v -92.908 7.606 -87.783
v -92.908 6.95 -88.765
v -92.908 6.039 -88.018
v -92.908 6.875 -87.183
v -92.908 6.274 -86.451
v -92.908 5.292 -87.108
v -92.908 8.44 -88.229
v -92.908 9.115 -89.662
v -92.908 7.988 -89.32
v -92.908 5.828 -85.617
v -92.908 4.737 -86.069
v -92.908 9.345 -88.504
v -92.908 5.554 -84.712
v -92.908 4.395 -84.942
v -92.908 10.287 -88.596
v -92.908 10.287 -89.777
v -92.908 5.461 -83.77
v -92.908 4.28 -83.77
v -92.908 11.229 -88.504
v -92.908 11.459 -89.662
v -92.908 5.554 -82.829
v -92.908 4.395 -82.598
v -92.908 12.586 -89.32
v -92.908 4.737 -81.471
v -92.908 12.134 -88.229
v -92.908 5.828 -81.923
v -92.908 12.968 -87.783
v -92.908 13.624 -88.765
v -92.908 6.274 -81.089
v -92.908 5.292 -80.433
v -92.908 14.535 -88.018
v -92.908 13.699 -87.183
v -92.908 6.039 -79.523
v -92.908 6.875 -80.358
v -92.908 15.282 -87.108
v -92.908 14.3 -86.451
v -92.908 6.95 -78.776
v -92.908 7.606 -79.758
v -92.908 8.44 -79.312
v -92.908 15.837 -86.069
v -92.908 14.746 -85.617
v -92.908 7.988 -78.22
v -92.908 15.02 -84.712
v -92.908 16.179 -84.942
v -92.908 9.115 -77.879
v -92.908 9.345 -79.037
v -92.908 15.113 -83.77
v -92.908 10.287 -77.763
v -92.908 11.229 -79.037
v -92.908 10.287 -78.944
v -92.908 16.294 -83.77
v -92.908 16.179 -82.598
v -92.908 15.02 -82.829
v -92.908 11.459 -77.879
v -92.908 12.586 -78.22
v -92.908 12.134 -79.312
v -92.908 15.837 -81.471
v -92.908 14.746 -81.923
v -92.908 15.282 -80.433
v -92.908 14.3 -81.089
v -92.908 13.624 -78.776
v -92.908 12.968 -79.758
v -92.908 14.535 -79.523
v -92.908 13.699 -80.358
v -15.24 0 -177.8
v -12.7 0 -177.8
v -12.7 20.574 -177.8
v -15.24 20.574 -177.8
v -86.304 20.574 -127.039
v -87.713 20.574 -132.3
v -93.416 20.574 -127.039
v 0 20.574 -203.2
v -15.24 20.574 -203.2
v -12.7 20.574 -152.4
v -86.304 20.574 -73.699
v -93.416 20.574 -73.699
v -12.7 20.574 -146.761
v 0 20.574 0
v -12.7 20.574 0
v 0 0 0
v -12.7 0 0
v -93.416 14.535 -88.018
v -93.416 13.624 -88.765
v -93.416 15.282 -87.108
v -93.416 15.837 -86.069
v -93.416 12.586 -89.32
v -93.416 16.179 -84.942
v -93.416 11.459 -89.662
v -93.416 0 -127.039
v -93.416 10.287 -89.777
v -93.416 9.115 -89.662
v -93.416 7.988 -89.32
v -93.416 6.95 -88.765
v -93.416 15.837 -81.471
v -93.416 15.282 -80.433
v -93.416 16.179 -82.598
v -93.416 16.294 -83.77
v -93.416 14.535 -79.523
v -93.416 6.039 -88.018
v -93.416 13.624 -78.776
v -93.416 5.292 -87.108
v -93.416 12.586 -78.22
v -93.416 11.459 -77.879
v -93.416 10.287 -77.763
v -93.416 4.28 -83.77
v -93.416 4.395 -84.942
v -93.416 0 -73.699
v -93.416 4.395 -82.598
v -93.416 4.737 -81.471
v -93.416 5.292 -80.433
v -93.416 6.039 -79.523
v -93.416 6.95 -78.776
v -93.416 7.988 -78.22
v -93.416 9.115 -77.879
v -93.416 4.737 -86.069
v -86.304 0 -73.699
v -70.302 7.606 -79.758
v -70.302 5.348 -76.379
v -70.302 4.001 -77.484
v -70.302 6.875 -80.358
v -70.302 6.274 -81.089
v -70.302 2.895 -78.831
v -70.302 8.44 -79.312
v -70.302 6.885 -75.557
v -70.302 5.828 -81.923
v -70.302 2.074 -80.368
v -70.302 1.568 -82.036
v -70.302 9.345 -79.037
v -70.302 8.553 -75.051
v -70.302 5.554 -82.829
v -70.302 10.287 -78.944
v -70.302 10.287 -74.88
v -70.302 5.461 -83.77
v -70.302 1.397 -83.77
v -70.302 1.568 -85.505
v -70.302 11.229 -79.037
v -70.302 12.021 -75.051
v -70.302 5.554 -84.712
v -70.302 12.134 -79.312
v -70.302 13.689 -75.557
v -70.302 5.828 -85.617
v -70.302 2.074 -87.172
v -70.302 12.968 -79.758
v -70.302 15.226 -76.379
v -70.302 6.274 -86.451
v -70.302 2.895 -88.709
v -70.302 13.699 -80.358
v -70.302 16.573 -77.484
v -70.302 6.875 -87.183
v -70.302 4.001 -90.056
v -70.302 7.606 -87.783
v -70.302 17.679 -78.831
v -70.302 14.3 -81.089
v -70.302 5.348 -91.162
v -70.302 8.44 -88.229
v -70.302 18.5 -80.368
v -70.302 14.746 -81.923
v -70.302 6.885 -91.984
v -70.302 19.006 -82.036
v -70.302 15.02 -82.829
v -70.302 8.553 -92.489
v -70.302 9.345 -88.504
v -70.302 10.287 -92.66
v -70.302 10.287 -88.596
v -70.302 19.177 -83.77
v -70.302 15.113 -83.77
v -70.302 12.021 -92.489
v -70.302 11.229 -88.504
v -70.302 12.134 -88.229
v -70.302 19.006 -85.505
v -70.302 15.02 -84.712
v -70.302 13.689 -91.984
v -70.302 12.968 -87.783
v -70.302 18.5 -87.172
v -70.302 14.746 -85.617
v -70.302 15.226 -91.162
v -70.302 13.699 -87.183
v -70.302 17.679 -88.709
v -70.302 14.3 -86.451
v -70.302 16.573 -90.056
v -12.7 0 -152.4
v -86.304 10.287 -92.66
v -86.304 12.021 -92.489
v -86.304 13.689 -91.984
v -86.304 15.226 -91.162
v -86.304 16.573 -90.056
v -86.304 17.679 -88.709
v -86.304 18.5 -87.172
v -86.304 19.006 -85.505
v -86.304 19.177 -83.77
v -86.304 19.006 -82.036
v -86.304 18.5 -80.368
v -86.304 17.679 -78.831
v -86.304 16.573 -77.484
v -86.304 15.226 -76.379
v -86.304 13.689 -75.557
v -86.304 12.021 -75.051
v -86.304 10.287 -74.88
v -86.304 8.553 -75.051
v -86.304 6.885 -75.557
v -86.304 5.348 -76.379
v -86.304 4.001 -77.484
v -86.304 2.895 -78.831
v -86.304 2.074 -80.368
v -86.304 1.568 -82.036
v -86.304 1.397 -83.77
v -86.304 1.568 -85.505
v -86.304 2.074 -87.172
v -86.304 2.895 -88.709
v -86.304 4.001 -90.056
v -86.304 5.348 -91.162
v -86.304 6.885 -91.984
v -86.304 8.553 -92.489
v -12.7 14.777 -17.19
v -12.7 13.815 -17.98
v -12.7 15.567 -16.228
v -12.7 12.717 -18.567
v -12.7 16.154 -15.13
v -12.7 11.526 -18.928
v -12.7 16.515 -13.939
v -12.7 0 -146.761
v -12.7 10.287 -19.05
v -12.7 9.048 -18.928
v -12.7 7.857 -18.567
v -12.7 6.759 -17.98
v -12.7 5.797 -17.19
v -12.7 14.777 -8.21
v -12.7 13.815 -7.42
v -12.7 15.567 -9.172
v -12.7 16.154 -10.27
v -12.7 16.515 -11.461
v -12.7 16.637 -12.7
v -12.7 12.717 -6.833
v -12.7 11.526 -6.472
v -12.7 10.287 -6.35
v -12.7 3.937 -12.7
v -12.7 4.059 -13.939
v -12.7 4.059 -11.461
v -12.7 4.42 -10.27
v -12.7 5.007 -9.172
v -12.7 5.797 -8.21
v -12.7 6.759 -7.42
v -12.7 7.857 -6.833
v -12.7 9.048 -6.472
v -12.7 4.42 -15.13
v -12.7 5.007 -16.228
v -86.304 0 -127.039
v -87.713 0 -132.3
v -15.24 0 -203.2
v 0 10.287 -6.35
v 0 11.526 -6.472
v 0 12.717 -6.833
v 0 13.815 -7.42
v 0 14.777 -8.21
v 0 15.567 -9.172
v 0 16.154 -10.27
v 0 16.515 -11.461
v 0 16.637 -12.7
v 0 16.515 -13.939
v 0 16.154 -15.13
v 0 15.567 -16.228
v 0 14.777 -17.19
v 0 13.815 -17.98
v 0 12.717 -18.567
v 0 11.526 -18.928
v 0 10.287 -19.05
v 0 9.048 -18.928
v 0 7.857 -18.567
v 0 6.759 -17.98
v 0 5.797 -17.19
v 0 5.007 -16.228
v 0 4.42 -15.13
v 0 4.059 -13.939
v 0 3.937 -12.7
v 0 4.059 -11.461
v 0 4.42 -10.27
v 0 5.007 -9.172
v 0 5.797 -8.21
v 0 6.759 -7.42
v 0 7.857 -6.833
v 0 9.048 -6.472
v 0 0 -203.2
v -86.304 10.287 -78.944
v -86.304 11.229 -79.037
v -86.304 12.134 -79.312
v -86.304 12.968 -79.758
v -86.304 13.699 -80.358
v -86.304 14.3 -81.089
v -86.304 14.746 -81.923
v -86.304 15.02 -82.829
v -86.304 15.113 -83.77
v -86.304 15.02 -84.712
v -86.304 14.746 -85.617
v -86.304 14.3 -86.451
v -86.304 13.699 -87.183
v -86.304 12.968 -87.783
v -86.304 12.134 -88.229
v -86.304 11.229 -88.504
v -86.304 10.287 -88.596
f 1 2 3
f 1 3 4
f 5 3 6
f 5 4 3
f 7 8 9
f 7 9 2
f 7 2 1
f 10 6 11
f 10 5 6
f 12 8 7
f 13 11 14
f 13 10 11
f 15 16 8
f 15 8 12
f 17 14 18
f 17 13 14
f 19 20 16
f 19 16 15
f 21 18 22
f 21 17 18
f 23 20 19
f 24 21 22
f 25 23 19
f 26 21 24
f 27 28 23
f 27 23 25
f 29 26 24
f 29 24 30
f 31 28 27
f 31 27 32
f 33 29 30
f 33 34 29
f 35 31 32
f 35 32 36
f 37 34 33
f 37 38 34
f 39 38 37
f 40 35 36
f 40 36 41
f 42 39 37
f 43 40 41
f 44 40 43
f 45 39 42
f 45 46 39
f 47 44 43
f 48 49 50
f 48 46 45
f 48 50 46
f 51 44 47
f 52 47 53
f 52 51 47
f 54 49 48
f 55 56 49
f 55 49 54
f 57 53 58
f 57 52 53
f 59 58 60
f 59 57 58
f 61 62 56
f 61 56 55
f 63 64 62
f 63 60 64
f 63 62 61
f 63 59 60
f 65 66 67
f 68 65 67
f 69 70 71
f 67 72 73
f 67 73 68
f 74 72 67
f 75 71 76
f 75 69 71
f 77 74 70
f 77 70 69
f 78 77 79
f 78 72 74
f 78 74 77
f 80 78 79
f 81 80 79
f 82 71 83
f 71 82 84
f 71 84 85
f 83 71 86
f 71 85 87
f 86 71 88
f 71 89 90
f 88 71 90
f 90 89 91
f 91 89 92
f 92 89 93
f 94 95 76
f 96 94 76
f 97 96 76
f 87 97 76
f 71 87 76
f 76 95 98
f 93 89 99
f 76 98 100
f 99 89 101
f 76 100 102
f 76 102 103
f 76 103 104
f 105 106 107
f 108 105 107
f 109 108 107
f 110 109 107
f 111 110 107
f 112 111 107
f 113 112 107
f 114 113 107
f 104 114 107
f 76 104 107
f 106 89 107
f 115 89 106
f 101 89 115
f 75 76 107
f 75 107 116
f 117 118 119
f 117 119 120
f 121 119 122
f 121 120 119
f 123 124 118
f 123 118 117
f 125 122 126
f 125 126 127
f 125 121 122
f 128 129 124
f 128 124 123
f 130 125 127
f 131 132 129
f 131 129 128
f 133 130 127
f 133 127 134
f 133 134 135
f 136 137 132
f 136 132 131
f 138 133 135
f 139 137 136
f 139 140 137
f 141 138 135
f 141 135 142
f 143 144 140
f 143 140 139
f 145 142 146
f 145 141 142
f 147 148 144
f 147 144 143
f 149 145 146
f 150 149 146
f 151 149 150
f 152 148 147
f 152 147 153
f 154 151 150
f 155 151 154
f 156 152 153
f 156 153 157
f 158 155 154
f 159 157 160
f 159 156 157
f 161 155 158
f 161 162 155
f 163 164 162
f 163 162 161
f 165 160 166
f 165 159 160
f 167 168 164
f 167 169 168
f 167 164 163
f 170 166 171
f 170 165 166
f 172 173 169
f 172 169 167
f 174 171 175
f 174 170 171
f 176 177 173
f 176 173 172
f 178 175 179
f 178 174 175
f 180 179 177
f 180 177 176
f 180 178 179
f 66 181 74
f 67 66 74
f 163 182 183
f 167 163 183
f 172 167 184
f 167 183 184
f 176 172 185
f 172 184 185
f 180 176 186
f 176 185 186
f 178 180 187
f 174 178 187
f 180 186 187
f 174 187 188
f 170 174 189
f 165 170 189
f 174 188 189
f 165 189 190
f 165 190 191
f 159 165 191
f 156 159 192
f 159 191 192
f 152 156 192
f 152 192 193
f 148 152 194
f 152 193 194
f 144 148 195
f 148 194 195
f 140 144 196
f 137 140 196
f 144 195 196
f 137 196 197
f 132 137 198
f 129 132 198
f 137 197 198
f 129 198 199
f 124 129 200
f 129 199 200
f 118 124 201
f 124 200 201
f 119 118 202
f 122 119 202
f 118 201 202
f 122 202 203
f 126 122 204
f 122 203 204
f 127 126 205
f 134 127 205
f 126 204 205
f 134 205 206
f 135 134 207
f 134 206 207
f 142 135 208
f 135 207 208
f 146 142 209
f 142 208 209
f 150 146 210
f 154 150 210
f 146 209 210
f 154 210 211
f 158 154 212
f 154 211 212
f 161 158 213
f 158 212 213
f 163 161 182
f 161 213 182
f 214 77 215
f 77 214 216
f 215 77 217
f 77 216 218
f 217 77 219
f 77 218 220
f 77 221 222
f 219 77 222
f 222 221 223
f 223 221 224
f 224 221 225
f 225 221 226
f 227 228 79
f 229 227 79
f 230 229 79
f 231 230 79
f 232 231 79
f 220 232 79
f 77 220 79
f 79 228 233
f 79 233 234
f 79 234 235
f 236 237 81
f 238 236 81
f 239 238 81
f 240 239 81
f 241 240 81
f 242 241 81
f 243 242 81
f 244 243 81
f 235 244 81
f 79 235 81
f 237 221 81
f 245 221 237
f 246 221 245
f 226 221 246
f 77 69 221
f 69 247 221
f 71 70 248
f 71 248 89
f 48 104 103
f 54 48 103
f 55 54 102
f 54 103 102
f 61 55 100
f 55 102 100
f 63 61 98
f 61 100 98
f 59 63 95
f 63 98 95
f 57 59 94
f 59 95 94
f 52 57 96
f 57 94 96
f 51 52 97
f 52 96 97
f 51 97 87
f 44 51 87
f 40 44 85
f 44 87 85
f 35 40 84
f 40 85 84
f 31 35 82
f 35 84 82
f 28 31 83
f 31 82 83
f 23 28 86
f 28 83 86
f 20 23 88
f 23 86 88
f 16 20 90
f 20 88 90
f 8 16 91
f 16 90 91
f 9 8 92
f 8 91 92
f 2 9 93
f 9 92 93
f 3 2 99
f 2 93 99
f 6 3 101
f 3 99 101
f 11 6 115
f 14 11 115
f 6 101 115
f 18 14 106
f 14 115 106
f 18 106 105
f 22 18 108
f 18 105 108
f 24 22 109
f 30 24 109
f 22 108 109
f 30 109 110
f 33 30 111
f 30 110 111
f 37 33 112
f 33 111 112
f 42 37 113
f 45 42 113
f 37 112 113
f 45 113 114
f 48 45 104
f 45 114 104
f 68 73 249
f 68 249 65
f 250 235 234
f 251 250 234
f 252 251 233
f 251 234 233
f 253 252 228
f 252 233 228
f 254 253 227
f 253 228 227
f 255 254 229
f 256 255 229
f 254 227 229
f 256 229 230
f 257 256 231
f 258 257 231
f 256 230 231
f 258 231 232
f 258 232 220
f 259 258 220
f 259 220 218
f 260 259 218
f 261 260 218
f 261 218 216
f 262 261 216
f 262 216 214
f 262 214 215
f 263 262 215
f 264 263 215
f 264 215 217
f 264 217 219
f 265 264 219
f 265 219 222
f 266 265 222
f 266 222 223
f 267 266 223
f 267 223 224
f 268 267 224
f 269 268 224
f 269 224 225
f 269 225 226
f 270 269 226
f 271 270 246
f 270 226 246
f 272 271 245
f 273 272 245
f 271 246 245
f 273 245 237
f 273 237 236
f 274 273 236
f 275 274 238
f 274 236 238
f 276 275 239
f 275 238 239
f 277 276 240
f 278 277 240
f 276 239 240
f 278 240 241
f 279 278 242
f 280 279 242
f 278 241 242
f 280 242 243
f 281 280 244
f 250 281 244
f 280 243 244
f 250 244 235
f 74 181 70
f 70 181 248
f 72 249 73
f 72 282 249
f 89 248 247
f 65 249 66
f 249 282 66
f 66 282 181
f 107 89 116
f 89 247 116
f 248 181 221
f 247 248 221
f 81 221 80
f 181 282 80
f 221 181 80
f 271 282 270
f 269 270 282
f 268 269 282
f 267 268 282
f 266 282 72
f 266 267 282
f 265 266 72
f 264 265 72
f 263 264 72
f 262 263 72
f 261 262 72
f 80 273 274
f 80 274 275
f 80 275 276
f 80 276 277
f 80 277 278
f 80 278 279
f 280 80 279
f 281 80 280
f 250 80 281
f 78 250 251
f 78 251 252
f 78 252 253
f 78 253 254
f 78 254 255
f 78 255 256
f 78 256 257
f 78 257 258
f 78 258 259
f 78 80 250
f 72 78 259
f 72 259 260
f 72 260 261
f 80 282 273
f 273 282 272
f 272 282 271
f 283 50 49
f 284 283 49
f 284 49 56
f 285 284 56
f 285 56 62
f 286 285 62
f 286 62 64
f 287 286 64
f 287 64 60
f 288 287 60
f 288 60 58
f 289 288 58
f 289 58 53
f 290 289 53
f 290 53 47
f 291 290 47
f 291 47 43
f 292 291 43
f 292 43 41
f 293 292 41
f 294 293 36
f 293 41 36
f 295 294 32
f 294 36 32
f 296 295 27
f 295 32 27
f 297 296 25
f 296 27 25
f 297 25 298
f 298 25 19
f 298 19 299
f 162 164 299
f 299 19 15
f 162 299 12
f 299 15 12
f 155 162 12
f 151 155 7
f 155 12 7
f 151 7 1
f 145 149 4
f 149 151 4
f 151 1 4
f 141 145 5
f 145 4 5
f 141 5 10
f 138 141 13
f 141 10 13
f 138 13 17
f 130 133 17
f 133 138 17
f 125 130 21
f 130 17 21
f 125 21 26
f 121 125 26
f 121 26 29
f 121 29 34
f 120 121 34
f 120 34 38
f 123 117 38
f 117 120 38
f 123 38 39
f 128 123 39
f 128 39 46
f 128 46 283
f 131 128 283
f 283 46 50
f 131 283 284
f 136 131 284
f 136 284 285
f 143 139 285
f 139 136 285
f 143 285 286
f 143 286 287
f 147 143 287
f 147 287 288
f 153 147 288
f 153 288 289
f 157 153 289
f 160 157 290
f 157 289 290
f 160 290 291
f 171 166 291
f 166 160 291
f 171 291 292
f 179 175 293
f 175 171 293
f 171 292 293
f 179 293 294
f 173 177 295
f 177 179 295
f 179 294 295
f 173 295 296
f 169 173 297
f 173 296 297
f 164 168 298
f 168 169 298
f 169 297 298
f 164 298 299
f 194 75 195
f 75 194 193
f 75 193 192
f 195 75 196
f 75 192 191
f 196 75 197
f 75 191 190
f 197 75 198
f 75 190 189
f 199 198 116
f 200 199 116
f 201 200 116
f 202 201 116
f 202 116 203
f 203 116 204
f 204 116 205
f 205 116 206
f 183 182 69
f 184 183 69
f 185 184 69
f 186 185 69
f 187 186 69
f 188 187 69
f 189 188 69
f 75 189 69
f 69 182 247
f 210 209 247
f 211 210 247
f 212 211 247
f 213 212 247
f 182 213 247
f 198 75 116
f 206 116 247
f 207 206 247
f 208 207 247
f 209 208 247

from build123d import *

# Parameters (mm, degrees)
SKETCH1_W         = 12.7
SKETCH1_H         = 177.8
EXTRUSION1_DEPTH  = 20.574
EXTRUSION3_DEPTH  = 20.32
SKETCH4_R         = 6.35
EXTRUSION4_DEPTH  = 20.32
EXTRUSION5_DEPTH  = 0.254
SKETCH7_R         = 6.0071
EXTRUSION7_DEPTH  = 0.508
SKETCH8_R         = 4.826
EXTRUSION8_DEPTH  = 22.86
SKETCH9_R         = 8.89
SKETCH9_R_2       = 6.0071
EXTRUSION9_DEPTH  = 16.002
SKETCH10_R        = 6.0071
SKETCH10_R_2      = 4.826
EXTRUSION10_DEPTH = 16.002
SKETCH11_W        = 12.7
SKETCH11_H        = 20.574
EXTRUSION14_DEPTH = 25.4
SKETCH12_W        = 25.4
SKETCH12_H        = 20.574
EXTRUSION15_DEPTH = 2.54


with BuildPart() as part:
    # Sketch1 → Extrusion1 (new body)
    with BuildSketch(Plane(origin=(0, 0, 0), x_dir=(-1, 0, 0), z_dir=(0, 1, 0))):
        with Locations((6.35, -88.9)):
            Rectangle(SKETCH1_W, SKETCH1_H)
    extrude(amount=EXTRUSION1_DEPTH)

    # Sketch3 → Extrusion3 (add)
    with BuildSketch(Plane.XZ):
        Polygon((-12.7, -152.4), (-12.7, -146.7612), (-86.303547963, -127.039188763), (-86.303547963, -73.699188763), (-93.415547963, -73.699188763), (-93.415547963, -127.039188763), (-87.713247963, -132.300260787), align=None)
    extrude(amount=-EXTRUSION3_DEPTH)

    # Sketch4 → Extrusion4 (cut)
    with BuildSketch(Plane.ZY.offset(12.7)):
        with Locations((-12.7, 10.287)):
            Circle(SKETCH4_R)
    extrude(amount=-EXTRUSION4_DEPTH, mode=Mode.SUBTRACT)

    # Sketch5 → Extrusion5 (add)
    with BuildSketch(Plane(origin=(0, 20.32, 0), x_dir=(1, 0, 0), z_dir=(0, 1, 0))):
        Polygon((-86.303547963, 73.699188763), (-86.303547963, 127.039188763), (-12.7, 146.7612), (-12.7, 152.4), (-87.713247963, 132.300260787), (-93.415547963, 127.039188763), (-93.415547963, 73.699188763), align=None)
    extrude(amount=EXTRUSION5_DEPTH)

    # Sketch7 → Extrusion7 (cut)
    with BuildSketch(Plane.ZY.offset(93.415547963)):
        with Locations((-83.770288763, 10.287)):
            Circle(SKETCH7_R)
    extrude(amount=-EXTRUSION7_DEPTH, mode=Mode.SUBTRACT)

    # Sketch8 → Extrusion8 (cut)
    with BuildSketch(Plane.ZY.offset(92.907547963)):
        with Locations((-83.770288763, 10.287)):
            Circle(SKETCH8_R)
    extrude(amount=-EXTRUSION8_DEPTH, mode=Mode.SUBTRACT)

    # Sketch9 → Extrusion9 (add)
    with BuildSketch(Plane(origin=(-86.303547963, 0, 0), x_dir=(0, 0, -1), z_dir=(1, 0, 0))):
        with Locations((83.770288763, 10.287)):
            Circle(SKETCH9_R)
        with Locations((83.770288763, 10.287)):
            Circle(SKETCH9_R_2, mode=Mode.SUBTRACT)
    extrude(amount=EXTRUSION9_DEPTH)

    # Sketch10 → Extrusion10 (add)
    with BuildSketch(Plane(origin=(-86.303547963, 10.287, -83.770288763), x_dir=(0, 0, -1), z_dir=(1, 0, 0))):
        Circle(SKETCH10_R)
        Circle(SKETCH10_R_2, mode=Mode.SUBTRACT)
    extrude(amount=EXTRUSION10_DEPTH)

    # Sketch11 → Extrusion14 (add)
    with BuildSketch(Plane(origin=(0, 0, -177.8), x_dir=(-1, 0, 0), z_dir=(0, 0, -1))):
        with Locations((6.35, 10.287)):
            Rectangle(SKETCH11_W, SKETCH11_H)
    extrude(amount=EXTRUSION14_DEPTH)

    # Sketch12 → Extrusion15 (add)
    with BuildSketch(Plane.ZY.offset(12.7)):
        with Locations((-190.5, 10.287)):
            Rectangle(SKETCH12_W, SKETCH12_H)
    extrude(amount=EXTRUSION15_DEPTH)


solid = part.part
